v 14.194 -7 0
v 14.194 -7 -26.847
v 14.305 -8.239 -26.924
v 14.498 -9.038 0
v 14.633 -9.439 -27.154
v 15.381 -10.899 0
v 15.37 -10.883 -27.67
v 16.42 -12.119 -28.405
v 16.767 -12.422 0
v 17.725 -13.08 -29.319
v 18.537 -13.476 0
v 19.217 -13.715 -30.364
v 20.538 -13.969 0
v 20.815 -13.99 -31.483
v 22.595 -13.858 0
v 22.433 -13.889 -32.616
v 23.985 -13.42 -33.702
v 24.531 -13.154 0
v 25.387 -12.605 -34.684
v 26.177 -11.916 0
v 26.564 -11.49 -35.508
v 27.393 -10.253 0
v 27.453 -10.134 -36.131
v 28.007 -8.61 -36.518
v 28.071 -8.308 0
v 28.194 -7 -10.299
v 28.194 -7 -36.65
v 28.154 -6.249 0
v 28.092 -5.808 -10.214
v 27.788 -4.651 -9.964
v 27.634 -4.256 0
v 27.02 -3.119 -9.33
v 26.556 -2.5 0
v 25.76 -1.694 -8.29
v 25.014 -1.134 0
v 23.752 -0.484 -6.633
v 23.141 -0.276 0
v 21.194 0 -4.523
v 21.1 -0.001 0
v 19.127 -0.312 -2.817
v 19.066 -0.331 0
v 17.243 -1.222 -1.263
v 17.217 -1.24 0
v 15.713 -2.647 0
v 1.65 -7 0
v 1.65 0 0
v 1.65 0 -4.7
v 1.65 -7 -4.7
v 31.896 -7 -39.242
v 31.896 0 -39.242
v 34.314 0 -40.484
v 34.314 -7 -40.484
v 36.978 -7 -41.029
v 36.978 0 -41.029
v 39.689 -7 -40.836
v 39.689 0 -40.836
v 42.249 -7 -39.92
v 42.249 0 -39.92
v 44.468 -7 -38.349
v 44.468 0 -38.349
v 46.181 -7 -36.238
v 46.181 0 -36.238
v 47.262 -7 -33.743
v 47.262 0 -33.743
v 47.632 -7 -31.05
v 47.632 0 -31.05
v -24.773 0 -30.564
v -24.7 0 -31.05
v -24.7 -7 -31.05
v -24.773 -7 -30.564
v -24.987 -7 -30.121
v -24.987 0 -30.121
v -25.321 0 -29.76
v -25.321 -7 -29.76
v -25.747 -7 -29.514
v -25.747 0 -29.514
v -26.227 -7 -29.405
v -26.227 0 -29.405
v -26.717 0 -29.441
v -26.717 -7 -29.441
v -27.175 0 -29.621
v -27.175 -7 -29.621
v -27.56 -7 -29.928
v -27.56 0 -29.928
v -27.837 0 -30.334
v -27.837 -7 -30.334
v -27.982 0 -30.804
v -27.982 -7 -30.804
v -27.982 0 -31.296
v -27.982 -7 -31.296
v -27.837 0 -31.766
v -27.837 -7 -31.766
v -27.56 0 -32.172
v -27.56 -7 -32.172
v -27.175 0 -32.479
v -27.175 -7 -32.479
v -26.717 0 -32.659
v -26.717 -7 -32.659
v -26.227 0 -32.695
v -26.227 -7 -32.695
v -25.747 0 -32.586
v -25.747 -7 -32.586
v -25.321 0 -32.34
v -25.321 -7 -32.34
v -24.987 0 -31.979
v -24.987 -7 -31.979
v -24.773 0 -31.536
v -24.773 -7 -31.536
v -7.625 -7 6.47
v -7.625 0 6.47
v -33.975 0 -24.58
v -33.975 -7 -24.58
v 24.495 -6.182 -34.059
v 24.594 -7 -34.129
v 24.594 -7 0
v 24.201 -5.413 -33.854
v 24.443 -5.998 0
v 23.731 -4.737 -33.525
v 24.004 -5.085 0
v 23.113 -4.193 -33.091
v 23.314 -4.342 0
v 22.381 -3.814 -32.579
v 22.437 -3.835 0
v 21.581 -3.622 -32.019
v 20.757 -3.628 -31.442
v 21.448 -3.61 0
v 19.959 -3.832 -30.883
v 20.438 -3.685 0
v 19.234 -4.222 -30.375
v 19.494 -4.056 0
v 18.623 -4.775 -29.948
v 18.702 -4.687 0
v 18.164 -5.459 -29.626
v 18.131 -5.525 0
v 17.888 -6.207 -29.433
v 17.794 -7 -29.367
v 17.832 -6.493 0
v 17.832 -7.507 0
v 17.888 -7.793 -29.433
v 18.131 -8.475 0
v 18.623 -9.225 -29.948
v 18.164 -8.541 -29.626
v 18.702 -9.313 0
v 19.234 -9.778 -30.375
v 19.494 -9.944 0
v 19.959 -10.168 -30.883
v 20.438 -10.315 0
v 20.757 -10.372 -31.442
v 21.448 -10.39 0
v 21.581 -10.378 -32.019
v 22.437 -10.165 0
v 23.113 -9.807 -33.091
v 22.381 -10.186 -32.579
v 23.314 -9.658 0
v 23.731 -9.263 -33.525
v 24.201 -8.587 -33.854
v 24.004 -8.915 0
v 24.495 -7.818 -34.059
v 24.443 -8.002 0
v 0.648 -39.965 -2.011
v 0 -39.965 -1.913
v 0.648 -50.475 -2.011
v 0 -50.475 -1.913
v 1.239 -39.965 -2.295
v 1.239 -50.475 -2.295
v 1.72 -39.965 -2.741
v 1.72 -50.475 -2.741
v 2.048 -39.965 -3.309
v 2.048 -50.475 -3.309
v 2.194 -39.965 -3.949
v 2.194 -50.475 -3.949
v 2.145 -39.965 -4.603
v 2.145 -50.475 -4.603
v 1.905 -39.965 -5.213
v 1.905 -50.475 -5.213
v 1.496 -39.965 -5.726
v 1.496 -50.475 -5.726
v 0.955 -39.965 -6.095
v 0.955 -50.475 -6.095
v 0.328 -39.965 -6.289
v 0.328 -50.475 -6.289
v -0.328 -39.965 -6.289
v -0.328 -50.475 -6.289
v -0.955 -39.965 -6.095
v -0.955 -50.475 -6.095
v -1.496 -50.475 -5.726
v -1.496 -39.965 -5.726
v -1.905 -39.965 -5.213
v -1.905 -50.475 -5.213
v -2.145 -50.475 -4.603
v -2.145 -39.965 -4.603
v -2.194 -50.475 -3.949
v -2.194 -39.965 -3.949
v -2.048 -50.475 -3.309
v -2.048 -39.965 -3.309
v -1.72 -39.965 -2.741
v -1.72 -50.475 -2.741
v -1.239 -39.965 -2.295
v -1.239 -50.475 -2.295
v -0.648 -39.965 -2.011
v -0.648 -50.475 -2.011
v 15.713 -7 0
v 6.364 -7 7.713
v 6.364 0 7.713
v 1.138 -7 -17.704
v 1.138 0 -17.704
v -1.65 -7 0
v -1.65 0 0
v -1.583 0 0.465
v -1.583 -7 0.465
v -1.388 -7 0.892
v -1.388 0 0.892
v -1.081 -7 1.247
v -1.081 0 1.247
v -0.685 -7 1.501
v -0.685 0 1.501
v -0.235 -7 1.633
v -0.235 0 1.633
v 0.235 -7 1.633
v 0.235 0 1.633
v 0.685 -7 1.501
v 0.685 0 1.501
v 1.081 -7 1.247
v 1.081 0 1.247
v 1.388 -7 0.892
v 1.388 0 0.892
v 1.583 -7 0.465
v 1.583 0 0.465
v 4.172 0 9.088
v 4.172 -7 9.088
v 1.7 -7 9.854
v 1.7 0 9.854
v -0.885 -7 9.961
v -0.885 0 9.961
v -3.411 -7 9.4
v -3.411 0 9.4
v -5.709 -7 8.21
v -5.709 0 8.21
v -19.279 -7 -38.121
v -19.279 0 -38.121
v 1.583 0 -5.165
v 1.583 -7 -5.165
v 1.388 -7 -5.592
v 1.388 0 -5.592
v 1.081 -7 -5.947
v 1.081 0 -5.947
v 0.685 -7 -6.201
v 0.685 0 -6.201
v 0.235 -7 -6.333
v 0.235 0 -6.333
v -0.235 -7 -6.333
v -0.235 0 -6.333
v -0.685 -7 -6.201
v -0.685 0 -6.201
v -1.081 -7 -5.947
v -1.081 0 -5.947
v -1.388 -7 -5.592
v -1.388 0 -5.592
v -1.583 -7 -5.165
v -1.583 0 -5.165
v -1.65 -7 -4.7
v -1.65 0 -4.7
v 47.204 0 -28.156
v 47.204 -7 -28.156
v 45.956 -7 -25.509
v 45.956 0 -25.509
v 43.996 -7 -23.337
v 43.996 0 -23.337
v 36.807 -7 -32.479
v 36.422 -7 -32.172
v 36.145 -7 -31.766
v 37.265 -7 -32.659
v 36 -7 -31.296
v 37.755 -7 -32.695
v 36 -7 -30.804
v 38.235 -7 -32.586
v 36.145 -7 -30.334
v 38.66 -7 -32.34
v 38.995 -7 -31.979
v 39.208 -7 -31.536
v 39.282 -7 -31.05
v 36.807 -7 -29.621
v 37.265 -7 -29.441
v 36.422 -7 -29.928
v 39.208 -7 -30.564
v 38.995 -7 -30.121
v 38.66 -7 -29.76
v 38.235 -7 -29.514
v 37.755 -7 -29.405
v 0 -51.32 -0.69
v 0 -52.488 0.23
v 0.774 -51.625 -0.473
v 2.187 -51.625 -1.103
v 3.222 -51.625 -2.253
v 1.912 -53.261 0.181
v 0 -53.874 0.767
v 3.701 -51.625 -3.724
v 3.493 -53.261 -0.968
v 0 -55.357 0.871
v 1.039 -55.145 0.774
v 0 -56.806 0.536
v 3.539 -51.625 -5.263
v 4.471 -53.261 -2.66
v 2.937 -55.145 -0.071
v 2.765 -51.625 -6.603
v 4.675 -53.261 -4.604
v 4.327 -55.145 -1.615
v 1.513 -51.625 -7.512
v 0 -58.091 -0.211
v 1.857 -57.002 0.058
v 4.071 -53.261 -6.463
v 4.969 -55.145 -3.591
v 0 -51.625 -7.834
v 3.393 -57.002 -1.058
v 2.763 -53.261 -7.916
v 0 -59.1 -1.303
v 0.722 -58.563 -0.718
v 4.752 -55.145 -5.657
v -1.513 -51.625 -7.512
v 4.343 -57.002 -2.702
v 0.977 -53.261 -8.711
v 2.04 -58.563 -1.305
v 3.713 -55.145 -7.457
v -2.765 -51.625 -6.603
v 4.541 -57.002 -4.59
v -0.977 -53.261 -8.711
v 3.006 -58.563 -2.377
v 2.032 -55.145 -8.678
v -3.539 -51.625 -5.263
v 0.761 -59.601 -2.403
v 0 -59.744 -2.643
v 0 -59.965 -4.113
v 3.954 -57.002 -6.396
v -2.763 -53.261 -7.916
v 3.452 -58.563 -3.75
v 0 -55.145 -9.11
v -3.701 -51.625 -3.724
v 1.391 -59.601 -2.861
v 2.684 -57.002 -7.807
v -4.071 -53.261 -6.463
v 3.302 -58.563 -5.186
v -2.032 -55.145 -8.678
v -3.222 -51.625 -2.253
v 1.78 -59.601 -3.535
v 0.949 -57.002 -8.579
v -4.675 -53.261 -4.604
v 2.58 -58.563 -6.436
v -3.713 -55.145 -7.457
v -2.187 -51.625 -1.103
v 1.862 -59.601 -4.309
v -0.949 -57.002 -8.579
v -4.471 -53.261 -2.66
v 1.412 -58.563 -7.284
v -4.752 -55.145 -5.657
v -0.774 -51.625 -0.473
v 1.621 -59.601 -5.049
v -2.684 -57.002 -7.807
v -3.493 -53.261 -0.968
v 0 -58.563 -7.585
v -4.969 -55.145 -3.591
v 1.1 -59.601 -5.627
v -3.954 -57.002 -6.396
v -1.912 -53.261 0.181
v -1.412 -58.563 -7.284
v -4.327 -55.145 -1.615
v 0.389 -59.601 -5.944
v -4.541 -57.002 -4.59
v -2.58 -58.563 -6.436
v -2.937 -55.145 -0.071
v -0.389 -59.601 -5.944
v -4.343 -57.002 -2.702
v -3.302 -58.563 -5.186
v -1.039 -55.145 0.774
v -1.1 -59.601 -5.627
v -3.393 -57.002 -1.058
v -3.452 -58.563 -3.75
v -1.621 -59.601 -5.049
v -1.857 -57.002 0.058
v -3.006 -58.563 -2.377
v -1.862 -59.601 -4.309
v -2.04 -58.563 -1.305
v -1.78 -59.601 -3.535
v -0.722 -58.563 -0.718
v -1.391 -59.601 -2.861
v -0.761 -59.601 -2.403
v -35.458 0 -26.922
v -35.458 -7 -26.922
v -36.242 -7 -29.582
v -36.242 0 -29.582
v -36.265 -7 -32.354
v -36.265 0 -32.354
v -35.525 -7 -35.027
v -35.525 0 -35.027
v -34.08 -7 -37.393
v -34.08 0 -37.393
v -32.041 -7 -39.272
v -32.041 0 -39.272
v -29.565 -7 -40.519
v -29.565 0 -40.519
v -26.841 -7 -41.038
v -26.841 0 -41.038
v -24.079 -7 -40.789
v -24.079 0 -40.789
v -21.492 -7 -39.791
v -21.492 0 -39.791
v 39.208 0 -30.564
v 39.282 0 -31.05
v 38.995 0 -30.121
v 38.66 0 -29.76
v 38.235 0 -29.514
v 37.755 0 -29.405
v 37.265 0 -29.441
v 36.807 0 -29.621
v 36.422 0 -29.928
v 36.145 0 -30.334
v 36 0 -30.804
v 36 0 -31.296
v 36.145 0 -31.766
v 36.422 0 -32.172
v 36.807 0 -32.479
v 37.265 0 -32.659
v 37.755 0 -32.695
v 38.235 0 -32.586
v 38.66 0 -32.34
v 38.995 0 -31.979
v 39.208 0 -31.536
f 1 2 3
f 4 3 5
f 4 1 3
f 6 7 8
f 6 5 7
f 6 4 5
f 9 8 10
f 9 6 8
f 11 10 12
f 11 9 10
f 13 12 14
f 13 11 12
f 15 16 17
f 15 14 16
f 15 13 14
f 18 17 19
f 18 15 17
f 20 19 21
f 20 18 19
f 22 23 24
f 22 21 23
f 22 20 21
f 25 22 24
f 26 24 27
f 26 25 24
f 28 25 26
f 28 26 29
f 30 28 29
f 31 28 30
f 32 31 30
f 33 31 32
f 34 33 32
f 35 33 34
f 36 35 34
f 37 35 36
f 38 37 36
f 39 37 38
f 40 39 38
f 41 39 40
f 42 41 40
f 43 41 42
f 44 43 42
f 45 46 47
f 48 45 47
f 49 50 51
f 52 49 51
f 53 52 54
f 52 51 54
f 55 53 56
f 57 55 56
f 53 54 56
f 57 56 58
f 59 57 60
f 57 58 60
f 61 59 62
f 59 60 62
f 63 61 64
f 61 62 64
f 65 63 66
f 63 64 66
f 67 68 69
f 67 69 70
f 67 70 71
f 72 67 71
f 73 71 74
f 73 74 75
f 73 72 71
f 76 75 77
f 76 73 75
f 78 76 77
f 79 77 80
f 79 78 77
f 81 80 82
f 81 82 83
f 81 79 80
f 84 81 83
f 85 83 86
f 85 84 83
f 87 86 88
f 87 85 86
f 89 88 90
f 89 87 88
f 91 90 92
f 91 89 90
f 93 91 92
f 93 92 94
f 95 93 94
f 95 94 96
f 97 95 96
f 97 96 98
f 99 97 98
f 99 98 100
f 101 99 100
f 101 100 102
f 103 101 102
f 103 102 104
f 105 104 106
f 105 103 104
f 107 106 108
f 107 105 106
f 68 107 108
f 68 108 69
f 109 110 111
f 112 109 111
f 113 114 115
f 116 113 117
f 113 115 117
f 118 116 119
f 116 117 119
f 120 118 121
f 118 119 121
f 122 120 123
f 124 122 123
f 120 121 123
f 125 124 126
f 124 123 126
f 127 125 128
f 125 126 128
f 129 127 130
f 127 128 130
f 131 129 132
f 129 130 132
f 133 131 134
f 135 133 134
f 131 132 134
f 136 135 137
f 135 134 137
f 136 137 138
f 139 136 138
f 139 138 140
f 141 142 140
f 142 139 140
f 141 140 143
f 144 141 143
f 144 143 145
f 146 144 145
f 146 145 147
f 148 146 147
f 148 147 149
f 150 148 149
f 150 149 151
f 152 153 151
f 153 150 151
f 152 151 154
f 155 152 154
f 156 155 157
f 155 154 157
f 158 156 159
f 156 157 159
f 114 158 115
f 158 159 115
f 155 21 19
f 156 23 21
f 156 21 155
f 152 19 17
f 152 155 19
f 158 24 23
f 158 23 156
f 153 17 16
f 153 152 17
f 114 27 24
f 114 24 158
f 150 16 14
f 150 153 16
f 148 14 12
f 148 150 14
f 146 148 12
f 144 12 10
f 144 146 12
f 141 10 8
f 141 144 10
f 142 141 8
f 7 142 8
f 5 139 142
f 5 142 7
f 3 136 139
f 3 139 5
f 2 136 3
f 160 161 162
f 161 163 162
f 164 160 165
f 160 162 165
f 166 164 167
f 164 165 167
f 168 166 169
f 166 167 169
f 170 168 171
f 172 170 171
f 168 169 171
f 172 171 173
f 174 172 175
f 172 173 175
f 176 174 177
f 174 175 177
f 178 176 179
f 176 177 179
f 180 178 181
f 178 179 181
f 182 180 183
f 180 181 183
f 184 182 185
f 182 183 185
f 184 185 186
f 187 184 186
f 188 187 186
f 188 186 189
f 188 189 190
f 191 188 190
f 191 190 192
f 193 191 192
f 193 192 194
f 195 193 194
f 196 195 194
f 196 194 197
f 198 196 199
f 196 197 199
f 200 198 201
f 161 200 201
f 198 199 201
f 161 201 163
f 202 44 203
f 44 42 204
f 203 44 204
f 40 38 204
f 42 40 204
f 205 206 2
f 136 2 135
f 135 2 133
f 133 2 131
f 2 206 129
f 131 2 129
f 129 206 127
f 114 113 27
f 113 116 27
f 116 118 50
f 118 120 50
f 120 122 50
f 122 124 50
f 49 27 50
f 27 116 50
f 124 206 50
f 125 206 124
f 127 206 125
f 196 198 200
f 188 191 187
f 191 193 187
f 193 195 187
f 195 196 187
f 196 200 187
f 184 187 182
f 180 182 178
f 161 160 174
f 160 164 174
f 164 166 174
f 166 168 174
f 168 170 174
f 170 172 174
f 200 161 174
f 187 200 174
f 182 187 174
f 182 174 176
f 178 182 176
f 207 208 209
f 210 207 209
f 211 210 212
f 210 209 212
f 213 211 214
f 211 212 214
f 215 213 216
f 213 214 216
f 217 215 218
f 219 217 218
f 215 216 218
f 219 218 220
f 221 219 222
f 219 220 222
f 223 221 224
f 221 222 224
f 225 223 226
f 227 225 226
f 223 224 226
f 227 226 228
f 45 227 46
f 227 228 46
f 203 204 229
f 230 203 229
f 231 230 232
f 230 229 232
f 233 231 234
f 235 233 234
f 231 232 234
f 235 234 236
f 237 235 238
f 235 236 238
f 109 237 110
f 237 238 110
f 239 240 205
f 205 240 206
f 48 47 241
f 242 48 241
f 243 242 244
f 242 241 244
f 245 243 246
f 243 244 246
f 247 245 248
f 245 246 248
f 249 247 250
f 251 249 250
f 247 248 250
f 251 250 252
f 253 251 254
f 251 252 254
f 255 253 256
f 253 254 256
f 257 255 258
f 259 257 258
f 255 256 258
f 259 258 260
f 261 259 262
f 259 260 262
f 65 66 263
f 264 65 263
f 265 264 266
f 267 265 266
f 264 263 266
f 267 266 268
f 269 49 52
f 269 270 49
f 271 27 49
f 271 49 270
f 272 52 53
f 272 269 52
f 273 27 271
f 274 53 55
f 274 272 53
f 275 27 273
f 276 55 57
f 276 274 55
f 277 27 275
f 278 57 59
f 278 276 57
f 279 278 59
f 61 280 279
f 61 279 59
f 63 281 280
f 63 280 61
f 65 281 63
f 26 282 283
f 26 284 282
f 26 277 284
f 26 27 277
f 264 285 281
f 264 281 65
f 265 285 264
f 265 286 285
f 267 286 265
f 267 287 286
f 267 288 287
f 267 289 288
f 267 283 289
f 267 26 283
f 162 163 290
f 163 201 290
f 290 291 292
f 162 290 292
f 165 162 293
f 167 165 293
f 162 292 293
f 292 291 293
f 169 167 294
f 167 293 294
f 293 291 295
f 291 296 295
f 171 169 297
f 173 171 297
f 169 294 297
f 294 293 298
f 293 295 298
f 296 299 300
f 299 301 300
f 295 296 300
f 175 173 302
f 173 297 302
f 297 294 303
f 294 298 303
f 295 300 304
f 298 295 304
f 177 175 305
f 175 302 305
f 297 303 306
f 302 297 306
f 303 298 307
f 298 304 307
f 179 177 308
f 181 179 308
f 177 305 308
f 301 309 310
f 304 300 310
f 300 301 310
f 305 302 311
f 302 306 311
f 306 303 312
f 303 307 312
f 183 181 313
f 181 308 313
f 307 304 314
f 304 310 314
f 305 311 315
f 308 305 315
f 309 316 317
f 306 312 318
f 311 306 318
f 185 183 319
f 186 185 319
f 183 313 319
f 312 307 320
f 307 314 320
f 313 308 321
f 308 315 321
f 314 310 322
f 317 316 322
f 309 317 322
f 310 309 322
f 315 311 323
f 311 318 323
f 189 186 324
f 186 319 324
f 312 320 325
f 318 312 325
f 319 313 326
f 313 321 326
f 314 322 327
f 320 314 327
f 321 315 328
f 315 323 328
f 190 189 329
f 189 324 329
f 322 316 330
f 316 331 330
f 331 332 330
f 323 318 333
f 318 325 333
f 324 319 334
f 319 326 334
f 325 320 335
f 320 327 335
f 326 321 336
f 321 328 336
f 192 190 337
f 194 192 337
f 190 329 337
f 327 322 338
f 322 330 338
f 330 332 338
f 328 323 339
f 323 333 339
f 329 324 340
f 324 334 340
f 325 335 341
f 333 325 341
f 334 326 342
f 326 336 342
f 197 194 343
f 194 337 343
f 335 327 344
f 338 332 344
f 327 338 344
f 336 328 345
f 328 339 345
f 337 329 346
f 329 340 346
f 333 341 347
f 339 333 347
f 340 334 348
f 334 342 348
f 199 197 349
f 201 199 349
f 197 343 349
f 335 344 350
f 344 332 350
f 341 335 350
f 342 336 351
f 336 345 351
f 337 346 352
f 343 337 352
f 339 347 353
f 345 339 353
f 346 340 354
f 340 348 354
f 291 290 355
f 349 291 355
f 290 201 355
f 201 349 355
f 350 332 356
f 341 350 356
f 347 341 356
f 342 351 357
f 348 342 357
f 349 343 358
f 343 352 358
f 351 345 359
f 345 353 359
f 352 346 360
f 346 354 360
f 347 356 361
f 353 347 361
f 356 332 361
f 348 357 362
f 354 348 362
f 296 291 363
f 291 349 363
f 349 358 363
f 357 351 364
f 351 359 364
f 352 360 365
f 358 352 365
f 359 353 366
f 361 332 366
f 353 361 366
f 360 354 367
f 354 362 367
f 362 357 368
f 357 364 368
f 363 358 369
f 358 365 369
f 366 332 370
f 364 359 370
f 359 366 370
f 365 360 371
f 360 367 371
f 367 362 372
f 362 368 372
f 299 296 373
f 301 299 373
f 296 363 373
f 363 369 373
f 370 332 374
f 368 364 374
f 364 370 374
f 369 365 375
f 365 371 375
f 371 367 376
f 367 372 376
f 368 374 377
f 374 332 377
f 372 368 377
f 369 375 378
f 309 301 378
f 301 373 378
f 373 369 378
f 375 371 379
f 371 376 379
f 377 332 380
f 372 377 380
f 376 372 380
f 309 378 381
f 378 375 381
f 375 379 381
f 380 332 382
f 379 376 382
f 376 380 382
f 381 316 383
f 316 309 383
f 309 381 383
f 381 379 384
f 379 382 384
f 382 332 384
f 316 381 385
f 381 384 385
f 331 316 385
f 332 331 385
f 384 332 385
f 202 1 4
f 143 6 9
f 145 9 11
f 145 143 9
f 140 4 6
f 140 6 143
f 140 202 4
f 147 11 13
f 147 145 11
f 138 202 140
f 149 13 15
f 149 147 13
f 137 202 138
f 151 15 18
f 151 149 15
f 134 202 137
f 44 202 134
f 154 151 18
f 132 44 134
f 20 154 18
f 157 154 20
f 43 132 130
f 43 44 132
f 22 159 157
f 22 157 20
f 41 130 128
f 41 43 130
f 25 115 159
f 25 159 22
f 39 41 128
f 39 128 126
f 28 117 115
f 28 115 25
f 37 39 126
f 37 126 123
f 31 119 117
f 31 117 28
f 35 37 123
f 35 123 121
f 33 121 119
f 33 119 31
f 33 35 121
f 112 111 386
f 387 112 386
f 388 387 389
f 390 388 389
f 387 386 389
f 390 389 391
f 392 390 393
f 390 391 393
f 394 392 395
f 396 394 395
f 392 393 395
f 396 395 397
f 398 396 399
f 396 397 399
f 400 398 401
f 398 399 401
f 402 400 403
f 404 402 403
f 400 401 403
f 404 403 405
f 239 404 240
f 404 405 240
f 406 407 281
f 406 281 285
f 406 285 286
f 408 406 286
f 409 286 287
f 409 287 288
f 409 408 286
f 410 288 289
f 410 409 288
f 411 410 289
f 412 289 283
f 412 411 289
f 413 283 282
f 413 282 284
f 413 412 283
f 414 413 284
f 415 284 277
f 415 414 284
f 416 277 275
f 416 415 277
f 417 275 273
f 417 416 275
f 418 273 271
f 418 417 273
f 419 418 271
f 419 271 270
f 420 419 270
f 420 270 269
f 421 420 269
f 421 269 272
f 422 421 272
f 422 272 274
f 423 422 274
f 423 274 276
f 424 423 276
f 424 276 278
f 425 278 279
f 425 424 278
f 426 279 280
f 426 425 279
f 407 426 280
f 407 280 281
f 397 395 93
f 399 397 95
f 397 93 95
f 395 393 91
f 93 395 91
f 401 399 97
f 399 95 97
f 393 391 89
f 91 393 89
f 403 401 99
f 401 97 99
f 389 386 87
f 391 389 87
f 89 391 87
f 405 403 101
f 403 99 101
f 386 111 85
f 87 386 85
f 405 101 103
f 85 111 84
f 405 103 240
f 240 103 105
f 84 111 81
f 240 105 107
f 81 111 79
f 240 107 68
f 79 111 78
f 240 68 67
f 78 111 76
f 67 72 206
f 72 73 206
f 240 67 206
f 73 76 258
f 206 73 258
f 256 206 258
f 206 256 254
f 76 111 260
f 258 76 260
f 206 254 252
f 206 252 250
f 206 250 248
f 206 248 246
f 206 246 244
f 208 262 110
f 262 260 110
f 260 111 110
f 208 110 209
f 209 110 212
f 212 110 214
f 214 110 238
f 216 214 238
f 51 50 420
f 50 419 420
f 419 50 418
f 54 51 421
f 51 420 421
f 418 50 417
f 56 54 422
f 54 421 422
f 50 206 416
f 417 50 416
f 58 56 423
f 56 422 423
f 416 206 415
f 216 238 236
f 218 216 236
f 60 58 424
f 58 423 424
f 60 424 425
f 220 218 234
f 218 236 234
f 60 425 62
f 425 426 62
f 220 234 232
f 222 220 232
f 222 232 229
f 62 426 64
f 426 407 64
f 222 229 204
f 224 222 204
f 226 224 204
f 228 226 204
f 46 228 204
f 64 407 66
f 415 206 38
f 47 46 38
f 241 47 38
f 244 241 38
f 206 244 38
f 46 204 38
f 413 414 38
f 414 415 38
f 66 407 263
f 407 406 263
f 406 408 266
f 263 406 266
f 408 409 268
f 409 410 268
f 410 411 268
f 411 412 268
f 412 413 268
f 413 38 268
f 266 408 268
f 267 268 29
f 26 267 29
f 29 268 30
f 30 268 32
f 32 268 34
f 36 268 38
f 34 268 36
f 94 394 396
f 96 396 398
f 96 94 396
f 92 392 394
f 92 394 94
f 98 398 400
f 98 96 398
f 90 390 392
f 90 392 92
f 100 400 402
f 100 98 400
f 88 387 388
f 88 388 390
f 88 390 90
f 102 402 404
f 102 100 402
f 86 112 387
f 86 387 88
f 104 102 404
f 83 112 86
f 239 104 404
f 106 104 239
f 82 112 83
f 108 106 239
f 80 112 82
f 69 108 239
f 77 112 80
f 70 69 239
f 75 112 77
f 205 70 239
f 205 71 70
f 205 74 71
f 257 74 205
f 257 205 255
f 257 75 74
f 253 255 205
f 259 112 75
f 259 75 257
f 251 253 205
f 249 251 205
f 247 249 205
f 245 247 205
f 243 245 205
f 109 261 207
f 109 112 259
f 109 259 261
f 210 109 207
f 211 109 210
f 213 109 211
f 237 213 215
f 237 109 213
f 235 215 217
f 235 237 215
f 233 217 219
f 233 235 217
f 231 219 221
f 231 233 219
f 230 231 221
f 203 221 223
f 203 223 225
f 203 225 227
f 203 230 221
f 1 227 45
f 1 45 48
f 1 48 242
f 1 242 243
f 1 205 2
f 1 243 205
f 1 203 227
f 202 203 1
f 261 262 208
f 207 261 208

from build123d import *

# Parameters (mm, degrees)
F0_R     = 1.65
F1_DEPTH = 7
F4_R     = 7
F4_R_2   = 3.4
F5_REACH = 60.8499898732
F6_DEPTH = 41.051


with BuildPart() as f1:
    # F0 (on Front) → F1 (new body)
    with BuildSketch(Plane.XZ):
        with BuildLine():
            ThreePointArc((-19.2789321881, -38.1210678119), (-17.1112046749, -34.8768343237), (-16.35, -31.05))
            ThreePointArc((-16.35, -31.05), (-22.9036546106, -21.6626306424), (-33.9745406914, -24.5795765791))
            ThreePointArc((-33.9745406914, -24.5795765791), (-33.1263986939, -38.4039391309), (-19.2789321881, -38.1210678119))
        make_face()
        with Locations((-26.35, -31.05)):
            Circle(F0_R, mode=Mode.SUBTRACT)
        with BuildLine():
            ThreePointArc((-33.9745406914, -24.5795765791), (-22.9036546106, -21.6626306424), (-16.35, -31.05))
            ThreePointArc((-16.35, -31.05), (-17.1112046749, -34.8768343237), (-19.2789321881, -38.1210678119))
            Line((-19.2789321881, -38.1210678119), (1.1377374189, -17.7043982048))
            Line((1.1377374189, -17.7043982048), (-5.7357643635, -12.8915204429))
            ThreePointArc((-5.7357643635, -12.8915204429), (-9.3541818752, -8.2354322855), (-9.7199537036, -2.35))
            ThreePointArc((-9.7199537036, -2.35), (-9.7292260116, 2.3113115789), (-7.6245406914, 6.4704234209))
            Line((-7.6245406914, 6.4704234209), (-33.9745406914, -24.5795765791))
        make_face()
        with BuildLine():
            ThreePointArc((6.3642987803, 7.7133456447), (-0.8850233512, 9.9607596933), (-7.6245406914, 6.4704234209))
            ThreePointArc((-7.6245406914, 6.4704234209), (-9.7292260116, 2.3113115789), (-9.7199537036, -2.35))
            ThreePointArc((-9.7199537036, -2.35), (0, 5.3), (9.7199537036, -2.35))
            ThreePointArc((9.7199537036, -2.35), (9.9297416139, -1.1833137716), (10, 0))
            ThreePointArc((10, 0), (9.0455234178, 4.2636259332), (6.3642987803, 7.7133456447))
        make_face()
        with BuildLine():
            Line((-5.7357643635, -12.8915204429), (1.1377374189, -17.7043982048))
            Line((1.1377374189, -17.7043982048), (7.0710678119, -11.7710678119))
            ThreePointArc((7.0710678119, -11.7710678119), (0.8715574275, -14.6619469809), (-5.7357643635, -12.8915204429))
        make_face()
        with BuildLine():
            Line((7.0710678119, -11.7710678119), (1.1377374189, -17.7043982048))
            Line((1.1377374189, -17.7043982048), (31.8959356141, -39.2415204429))
            ThreePointArc((31.8959356141, -39.2415204429), (29.6730596921, -24.9952460987), (43.995998758, -23.3366543553))
            Line((43.995998758, -23.3366543553), (6.3642987803, 7.7133456447))
            ThreePointArc((6.3642987803, 7.7133456447), (9.0455234178, 4.2636259332), (10, 0))
            ThreePointArc((10, 0), (9.9297416139, -1.1833137716), (9.7199537036, -2.35))
            ThreePointArc((9.7199537036, -2.35), (9.9297416139, -3.5166862284), (10, -4.7))
            ThreePointArc((10, -4.7), (9.2387953251, -8.5268343237), (7.0710678119, -11.7710678119))
        make_face()
        with BuildLine():
            ThreePointArc((43.995998758, -23.3366543553), (29.6730596921, -24.9952460987), (31.8959356141, -39.2415204429))
            ThreePointArc((31.8959356141, -39.2415204429), (42.24918611, -39.9201083318), (47.6316999777, -31.05))
            ThreePointArc((47.6316999777, -31.05), (46.6772233954, -26.7863740668), (43.995998758, -23.3366543553))
        make_face()
        with Locations((37.6316999777, -31.05)):
            Circle(F0_R, mode=Mode.SUBTRACT)
        with BuildLine():
            ThreePointArc((9.7199537036, -2.35), (0, 5.3), (-9.7199537036, -2.35))
            ThreePointArc((-9.7199537036, -2.35), (0, -10), (9.7199537036, -2.35))
        make_face()
        with BuildLine():
            ThreePointArc((-1.65, 0), (0, 1.65), (1.65, 0))
            Line((1.65, 0), (1.65, -4.7))
            ThreePointArc((1.65, -4.7), (0, -6.35), (-1.65, -4.7))
            Line((-1.65, -4.7), (-1.65, 0))
        make_face(mode=Mode.SUBTRACT)
        with BuildLine():
            ThreePointArc((9.7199537036, -2.35), (0, -10), (-9.7199537036, -2.35))
            ThreePointArc((-9.7199537036, -2.35), (-9.3541818752, -8.2354322855), (-5.7357643635, -12.8915204429))
            ThreePointArc((-5.7357643635, -12.8915204429), (0.8715574275, -14.6619469809), (7.0710678119, -11.7710678119))
            ThreePointArc((7.0710678119, -11.7710678119), (9.2387953251, -8.5268343237), (10, -4.7))
            ThreePointArc((10, -4.7), (9.9297416139, -3.5166862284), (9.7199537036, -2.35))
        make_face()
    extrude(amount=F1_DEPTH)

    f5_end = Plane(origin=(16.5168365165, -3.5, -28.4729593239), x_dir=(-0.8191520443, 0, 0.5735764364), z_dir=(-0.5735764364, 0, -0.8191520443))
    # F4 (on Top) → F5 (join, up to a plane its end follows)
    with BuildSketch(Plane.XY):
        with Locations((21.1943648756, -7)):
            Circle(F4_R)
        with Locations((21.1943648756, -7)):
            Circle(F4_R_2, mode=Mode.SUBTRACT)
    f5_long = extrude(amount=-F5_REACH, mode=Mode.PRIVATE)
    add(split(f5_long, bisect_by=f5_end, keep=Keep.BOTTOM, mode=Mode.PRIVATE))

    # F4 (on Top) → F6 (cut, through all)
    with BuildSketch(Plane.XY):
        with Locations((21.1943648756, -7)):
            Circle(F4_R_2)
    extrude(amount=-F6_DEPTH, mode=Mode.SUBTRACT)


with BuildPart() as f3:
    # F2 (on Right) → F3 (revolve)
    with BuildSketch(Plane.YZ):
        with BuildLine():
            Line((-39.9649430722, -1.9130847832), (-50.4749542081, -1.9130847832))
            ThreePointArc((-50.4749542081, -1.9130847832), (-56.0941143788, 0.7577439102), (-59.9649430722, -4.1130847832))
            Line((-59.9649430722, -4.1130847832), (-39.9649430722, -4.1130847832))
            Line((-39.9649430722, -4.1130847832), (-39.9649430722, -1.9130847832))
        make_face()
    revolve(axis=Axis((0, -49.9649430722, -4.1130847832), (0, 1, 0)))


solid = Compound([f1.part, f3.part])
